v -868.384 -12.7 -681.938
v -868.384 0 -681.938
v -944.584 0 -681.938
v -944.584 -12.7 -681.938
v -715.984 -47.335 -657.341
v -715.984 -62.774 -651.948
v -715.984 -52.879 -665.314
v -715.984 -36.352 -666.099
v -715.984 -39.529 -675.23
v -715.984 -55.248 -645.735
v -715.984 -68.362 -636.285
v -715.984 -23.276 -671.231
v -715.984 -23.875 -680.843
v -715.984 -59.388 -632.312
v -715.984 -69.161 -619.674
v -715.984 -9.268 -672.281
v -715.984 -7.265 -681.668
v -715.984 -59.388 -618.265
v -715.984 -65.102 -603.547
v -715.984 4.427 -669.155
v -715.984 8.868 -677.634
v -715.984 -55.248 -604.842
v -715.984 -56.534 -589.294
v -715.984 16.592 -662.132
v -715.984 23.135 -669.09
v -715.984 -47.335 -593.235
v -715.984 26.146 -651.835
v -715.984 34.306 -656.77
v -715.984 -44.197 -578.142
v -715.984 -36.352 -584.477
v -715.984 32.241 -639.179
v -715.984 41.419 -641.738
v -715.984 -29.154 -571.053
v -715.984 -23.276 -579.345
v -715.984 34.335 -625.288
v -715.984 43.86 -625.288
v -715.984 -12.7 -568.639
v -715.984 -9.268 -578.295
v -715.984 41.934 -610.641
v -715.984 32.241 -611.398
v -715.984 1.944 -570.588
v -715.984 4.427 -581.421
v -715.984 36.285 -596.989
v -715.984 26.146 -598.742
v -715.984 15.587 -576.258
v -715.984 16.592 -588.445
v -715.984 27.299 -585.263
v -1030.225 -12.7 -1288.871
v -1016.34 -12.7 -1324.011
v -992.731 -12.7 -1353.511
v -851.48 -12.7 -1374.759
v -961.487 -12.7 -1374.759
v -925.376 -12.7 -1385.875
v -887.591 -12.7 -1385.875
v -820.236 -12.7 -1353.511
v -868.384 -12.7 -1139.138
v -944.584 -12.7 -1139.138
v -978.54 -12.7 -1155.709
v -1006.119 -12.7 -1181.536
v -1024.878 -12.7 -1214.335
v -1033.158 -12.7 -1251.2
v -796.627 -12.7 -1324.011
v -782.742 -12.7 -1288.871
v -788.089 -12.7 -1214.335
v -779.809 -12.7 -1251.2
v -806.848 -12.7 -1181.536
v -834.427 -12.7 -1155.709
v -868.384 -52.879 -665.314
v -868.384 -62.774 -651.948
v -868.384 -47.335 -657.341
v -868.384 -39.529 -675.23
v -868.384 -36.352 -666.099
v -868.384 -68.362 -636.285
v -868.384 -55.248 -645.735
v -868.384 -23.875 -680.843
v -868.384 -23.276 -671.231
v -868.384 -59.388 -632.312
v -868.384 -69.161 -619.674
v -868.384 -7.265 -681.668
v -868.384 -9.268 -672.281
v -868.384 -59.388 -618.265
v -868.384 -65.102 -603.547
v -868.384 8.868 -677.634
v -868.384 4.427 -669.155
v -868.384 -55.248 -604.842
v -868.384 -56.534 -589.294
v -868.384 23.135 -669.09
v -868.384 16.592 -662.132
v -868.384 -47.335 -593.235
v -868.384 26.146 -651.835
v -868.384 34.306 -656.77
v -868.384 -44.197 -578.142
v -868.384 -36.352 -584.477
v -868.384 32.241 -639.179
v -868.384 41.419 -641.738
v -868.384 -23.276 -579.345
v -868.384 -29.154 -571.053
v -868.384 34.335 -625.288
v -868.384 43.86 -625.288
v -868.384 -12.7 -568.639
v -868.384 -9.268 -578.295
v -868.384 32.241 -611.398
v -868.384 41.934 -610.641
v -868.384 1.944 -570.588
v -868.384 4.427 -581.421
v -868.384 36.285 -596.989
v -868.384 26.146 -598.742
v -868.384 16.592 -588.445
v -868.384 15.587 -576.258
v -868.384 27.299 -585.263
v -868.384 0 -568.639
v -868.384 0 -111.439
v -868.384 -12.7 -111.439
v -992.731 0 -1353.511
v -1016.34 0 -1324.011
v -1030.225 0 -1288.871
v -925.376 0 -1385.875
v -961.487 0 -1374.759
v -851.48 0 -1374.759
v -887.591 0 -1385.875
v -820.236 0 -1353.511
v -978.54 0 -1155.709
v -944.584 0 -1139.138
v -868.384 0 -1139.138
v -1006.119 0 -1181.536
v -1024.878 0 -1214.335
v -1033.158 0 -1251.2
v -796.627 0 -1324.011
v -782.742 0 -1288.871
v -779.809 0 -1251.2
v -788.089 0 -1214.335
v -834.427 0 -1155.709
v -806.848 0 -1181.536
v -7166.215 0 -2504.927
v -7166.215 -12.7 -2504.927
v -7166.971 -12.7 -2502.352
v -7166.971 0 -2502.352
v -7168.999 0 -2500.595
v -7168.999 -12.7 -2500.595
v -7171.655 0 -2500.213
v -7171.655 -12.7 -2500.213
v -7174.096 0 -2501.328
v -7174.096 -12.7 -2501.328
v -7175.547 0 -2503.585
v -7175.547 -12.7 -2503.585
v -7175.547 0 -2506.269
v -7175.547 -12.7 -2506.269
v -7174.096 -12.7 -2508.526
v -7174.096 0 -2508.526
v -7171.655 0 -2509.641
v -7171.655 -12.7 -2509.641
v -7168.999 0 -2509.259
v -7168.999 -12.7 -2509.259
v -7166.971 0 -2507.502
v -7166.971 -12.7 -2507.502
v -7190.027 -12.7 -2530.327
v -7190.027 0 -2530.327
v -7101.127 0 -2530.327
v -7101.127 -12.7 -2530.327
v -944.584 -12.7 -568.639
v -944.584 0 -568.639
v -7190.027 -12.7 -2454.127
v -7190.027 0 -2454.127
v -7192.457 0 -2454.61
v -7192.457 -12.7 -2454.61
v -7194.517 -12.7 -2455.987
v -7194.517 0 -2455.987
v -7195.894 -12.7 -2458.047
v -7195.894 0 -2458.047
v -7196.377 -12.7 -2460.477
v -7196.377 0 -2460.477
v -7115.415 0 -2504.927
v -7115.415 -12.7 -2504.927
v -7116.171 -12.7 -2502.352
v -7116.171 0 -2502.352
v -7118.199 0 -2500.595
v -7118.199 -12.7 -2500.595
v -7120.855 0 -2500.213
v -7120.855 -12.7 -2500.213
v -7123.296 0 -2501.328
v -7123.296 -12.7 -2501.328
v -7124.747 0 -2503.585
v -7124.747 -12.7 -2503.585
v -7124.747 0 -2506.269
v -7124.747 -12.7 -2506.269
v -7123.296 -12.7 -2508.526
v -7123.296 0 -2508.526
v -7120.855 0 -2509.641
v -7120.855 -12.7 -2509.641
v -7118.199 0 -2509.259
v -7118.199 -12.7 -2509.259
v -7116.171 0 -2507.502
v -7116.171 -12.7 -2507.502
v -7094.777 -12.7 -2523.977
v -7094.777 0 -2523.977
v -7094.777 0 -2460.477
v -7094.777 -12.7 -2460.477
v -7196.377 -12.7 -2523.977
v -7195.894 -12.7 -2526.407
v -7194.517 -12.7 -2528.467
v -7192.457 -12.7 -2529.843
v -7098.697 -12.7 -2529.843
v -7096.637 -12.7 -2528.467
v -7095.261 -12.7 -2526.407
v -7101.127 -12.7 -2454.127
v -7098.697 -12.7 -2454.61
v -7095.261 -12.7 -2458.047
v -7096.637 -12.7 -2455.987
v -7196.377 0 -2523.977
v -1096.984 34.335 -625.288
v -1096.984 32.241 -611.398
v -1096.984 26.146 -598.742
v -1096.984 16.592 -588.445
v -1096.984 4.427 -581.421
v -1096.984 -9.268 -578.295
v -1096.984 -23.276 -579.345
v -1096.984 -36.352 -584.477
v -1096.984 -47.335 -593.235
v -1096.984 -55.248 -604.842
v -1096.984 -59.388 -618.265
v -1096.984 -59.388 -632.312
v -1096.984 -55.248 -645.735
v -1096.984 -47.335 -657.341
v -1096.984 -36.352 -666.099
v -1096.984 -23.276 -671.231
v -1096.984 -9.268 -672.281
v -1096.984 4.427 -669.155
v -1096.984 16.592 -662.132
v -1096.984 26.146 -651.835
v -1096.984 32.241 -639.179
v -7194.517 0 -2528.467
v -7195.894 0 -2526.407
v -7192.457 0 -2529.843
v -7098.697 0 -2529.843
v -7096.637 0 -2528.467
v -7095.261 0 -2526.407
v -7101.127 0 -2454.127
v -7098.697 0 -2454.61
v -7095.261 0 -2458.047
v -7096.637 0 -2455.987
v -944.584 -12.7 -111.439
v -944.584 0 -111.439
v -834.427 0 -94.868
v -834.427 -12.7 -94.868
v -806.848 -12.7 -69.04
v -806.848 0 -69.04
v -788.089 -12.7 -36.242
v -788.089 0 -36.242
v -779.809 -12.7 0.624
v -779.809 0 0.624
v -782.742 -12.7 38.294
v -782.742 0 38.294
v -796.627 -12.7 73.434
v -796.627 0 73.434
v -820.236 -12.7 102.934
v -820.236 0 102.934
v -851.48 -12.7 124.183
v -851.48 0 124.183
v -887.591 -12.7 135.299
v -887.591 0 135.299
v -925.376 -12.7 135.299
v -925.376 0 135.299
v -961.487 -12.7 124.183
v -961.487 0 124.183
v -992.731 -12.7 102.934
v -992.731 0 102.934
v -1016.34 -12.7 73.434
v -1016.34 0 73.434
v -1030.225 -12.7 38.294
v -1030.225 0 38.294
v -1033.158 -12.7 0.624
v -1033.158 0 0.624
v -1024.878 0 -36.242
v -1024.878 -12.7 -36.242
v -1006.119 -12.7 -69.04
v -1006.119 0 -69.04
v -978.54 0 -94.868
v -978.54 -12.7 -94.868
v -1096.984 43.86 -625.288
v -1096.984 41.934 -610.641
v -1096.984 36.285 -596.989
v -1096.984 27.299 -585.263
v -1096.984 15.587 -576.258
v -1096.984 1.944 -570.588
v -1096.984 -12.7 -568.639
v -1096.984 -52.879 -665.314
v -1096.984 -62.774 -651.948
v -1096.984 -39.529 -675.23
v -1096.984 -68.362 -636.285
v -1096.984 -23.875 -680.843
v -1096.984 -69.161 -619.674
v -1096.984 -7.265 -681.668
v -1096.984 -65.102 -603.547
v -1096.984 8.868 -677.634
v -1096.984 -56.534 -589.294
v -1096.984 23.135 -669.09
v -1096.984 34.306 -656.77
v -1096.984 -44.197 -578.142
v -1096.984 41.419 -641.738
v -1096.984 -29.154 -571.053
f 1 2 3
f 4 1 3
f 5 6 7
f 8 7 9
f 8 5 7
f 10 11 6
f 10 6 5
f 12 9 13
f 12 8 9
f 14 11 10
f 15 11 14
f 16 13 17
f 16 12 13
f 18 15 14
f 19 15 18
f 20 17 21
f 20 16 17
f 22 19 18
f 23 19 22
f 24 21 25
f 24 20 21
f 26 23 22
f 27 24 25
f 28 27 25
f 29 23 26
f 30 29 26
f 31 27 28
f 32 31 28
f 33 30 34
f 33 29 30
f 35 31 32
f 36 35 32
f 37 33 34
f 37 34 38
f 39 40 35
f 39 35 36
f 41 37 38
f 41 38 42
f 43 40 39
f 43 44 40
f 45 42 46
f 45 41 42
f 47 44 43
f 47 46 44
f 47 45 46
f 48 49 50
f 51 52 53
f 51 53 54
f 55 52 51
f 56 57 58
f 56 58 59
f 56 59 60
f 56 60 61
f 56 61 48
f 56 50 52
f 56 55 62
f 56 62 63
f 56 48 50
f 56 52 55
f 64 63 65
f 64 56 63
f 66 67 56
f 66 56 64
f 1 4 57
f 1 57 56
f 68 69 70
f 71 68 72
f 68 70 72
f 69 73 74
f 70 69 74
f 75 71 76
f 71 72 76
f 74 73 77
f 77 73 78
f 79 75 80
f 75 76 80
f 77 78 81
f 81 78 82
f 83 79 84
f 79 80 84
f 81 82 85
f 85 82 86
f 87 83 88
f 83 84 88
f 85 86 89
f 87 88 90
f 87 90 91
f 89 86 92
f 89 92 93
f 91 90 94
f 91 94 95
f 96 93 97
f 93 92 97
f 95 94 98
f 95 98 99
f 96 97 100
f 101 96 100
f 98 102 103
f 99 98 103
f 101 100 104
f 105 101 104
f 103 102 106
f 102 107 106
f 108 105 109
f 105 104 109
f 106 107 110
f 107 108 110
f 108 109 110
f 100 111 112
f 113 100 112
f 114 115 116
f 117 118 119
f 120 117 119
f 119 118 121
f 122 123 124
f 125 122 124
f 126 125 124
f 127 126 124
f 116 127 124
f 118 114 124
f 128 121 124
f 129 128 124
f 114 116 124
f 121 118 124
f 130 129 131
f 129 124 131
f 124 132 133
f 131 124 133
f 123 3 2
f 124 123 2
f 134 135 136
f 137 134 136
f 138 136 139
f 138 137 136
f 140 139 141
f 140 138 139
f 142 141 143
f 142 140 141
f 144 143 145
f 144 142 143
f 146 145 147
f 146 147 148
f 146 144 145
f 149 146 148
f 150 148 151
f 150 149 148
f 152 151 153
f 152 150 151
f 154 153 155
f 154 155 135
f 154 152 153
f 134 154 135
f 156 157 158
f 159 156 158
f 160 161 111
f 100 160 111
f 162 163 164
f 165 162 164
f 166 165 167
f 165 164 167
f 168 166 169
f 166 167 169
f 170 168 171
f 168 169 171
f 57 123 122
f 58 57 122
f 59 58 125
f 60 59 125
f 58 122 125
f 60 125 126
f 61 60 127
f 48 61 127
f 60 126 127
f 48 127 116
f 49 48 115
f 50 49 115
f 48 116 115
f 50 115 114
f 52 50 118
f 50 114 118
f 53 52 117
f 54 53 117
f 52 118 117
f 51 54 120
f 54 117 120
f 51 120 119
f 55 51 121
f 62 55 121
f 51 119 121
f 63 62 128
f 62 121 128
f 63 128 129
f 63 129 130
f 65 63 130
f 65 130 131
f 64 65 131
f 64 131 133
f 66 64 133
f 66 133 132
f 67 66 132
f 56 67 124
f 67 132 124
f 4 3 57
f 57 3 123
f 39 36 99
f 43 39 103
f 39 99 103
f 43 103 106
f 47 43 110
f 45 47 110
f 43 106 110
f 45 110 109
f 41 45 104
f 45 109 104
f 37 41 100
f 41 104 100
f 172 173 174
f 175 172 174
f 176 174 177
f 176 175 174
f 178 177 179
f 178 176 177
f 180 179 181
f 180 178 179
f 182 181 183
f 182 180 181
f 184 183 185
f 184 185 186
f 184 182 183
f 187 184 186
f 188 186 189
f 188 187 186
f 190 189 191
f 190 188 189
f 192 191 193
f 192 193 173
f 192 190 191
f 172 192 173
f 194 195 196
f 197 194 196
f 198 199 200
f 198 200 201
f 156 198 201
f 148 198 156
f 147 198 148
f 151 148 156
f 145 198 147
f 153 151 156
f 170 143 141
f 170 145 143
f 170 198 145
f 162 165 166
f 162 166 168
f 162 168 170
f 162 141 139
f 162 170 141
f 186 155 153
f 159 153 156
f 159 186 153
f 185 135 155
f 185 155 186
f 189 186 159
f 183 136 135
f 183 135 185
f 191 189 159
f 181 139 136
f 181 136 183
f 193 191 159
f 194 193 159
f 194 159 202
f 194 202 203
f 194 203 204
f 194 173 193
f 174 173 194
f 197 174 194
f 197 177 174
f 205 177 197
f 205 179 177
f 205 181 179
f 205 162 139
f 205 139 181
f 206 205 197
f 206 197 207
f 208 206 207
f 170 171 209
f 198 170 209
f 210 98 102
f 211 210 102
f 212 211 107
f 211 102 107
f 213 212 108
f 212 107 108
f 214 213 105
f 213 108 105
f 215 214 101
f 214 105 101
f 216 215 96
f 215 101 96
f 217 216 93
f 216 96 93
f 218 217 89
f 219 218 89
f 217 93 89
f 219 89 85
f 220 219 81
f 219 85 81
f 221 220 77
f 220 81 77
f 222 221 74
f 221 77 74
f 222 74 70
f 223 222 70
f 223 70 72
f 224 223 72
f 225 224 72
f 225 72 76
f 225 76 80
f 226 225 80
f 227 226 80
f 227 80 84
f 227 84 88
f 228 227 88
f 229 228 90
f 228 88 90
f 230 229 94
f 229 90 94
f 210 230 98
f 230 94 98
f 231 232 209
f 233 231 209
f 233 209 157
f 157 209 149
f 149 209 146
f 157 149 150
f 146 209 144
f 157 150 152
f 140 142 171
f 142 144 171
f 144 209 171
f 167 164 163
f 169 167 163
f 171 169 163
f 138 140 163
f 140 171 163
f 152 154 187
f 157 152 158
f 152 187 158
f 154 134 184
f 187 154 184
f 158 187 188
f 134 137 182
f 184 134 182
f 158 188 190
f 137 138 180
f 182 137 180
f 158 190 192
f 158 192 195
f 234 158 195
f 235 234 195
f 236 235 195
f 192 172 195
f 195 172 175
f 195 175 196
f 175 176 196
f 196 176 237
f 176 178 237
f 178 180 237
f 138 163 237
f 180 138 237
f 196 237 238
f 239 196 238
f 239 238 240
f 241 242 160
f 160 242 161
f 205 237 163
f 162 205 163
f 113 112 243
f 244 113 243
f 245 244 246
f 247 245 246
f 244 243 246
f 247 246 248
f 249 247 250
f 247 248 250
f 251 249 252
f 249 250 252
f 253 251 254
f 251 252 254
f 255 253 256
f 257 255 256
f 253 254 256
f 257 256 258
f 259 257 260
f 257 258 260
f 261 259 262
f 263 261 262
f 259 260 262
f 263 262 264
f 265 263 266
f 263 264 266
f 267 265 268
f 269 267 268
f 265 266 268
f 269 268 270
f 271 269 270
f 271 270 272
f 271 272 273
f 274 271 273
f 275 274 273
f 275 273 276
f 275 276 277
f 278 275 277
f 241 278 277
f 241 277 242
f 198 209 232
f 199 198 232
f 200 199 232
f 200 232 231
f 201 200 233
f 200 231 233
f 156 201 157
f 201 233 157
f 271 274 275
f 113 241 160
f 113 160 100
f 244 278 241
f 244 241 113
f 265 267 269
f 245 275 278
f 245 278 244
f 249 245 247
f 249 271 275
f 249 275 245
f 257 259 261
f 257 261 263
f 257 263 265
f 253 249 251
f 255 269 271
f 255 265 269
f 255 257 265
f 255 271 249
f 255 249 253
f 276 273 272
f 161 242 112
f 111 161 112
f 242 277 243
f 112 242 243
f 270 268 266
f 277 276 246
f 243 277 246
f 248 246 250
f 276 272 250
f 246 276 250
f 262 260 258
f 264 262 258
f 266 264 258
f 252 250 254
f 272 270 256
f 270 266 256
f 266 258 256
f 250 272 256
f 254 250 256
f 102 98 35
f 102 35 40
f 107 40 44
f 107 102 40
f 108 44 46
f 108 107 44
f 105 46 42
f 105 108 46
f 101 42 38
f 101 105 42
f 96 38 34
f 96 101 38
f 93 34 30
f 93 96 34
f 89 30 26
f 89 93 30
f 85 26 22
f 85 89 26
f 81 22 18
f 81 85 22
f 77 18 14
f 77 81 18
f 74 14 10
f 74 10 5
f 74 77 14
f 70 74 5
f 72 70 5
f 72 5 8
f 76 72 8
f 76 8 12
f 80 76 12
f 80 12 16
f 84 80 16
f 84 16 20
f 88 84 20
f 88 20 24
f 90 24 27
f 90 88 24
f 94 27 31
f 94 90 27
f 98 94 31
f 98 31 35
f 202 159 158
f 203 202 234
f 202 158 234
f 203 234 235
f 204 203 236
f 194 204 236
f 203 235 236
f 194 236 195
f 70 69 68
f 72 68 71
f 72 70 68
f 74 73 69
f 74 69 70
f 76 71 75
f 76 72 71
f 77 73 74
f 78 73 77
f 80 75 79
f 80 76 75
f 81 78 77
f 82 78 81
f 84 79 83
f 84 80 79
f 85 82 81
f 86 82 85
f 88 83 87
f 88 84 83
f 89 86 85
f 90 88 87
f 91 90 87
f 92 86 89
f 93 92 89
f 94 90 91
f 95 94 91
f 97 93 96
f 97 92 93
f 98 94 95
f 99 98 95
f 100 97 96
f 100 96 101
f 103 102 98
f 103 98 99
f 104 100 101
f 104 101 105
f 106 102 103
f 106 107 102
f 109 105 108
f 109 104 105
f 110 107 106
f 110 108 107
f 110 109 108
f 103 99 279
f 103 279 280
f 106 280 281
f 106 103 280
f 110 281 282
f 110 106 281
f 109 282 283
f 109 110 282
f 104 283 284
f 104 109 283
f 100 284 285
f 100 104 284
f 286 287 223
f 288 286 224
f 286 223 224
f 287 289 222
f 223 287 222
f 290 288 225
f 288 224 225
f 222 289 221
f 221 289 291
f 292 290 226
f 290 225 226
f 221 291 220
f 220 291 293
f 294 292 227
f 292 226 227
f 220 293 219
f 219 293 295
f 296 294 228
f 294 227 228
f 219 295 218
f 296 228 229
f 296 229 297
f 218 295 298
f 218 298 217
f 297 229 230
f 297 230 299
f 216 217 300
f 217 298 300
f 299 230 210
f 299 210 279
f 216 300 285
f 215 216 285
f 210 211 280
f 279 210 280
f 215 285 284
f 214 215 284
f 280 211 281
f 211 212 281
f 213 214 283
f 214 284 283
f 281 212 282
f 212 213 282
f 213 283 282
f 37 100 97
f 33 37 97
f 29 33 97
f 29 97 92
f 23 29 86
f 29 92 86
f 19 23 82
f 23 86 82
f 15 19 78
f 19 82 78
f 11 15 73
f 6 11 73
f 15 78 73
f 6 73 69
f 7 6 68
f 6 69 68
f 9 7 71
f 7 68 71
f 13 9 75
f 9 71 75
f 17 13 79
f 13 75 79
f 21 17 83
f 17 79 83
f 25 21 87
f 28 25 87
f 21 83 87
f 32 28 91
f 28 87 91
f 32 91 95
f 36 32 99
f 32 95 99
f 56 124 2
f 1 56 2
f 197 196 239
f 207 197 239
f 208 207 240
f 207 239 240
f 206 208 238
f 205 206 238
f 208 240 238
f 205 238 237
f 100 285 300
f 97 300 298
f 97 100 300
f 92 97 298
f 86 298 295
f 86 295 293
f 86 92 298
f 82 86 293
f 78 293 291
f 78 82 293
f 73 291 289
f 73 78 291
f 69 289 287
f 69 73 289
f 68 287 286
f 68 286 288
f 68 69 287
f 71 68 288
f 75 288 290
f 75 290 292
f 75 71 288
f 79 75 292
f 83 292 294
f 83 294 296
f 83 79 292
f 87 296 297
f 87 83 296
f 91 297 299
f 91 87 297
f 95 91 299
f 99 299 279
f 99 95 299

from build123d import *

# Parameters (mm, degrees)
F1_DEPTH = 12.7
F0_R     = 4.7625
F2_R     = 47.12472142
F3_DEPTH = 152.4
F4_DEPTH = 228.6


# Not quite as in the source:
# - a feature names something its author has since deleted; it is built from what else it names


with BuildPart() as f1:
    # F0 (on Front) → F1 (new body)
    with BuildSketch(Plane.XZ):
        with BuildLine():
            Line((-868.383522886, -568.6385392112), (-868.383522886, -111.4385392112))
            ThreePointArc((-868.383522886, -111.4385392112), (-906.483522886, 136.7117393687), (-944.583522886, -111.4385392112))
            Line((-944.583522886, -111.4385392112), (-944.583522886, -568.6385392112))
            Line((-944.583522886, -568.6385392112), (-868.383522886, -568.6385392112))
        make_face()
    extrude(amount=F1_DEPTH)


with BuildPart() as f1b:
    # F0 (on Front) → F1, piece 2 (new body)
    with BuildSketch(Plane.XZ):
        with BuildLine():
            Line((-944.583522886, -681.9379820513), (-944.583522886, -1139.1379820513))
            ThreePointArc((-944.583522886, -1139.1379820513), (-906.483522886, -1387.2882606313), (-868.383522886, -1139.1379820513))
            Line((-868.383522886, -1139.1379820513), (-868.383522886, -681.9379820513))
            Line((-868.383522886, -681.9379820513), (-944.583522886, -681.9379820513))
        make_face()
    extrude(amount=F1_DEPTH)


with BuildPart() as f1c:
    # F0 (on Front) → F1, piece 3 (new body)
    with BuildSketch(Plane.XZ):
        with BuildLine():
            Line((-7101.1272773743, -2454.1268432617), (-7190.0272773743, -2454.1268432617))
            ThreePointArc((-7190.0272773743, -2454.1268432617), (-7194.5174054348, -2455.9867152012), (-7196.3772773743, -2460.4768432617))
            Line((-7196.3772773743, -2460.4768432617), (-7196.3772773743, -2523.9768432617))
            ThreePointArc((-7196.3772773743, -2523.9768432617), (-7194.5174054348, -2528.4669713223), (-7190.0272773743, -2530.3268432617))
            Line((-7190.0272773743, -2530.3268432617), (-7101.1272773743, -2530.3268432617))
            ThreePointArc((-7101.1272773743, -2530.3268432617), (-7096.6371493137, -2528.4669713223), (-7094.7772773743, -2523.9768432617))
            Line((-7094.7772773743, -2523.9768432617), (-7094.7772773743, -2460.4768432617))
            ThreePointArc((-7094.7772773743, -2460.4768432617), (-7096.6371493137, -2455.9867152012), (-7101.1272773743, -2454.1268432617))
        make_face()
        with Locations((-7170.9772773743, -2504.9268432617)):
            Circle(F0_R, mode=Mode.SUBTRACT)
        with Locations((-7120.1772773743, -2504.9268432617)):
            Circle(F0_R, mode=Mode.SUBTRACT)
    extrude(amount=F1_DEPTH)


with BuildPart() as f3:
    # F2 (on face) → F3 (new body)
    with BuildSketch(Plane.YZ.offset(-868.383522886)):
        with BuildLine():
            ThreePointArc((-12.7000001128, -568.638610381), (-52.8789346424, -665.3139022013), (43.8599243822, -625.2882606313))
            ThreePointArc((43.8599243822, -625.2882606313), (27.2993405667, -585.2626190613), (-12.7000001128, -568.638610381))
        make_face()
        with Locations((-12.7897970378, -625.2882606313)):
            Circle(F2_R, mode=Mode.SUBTRACT)
    extrude(amount=F3_DEPTH)


with BuildPart() as f4:
    # F4 (new): a face of the model
    f4_faces = [f3.part.faces().sort_by_distance(p)[0] for p in [
        (-868.383522886, -67.8372223712, -625.2882606313),
    ]]
    extrude(f4_faces, amount=F4_DEPTH)


solid = Compound([f1.part, f1b.part, f1c.part, f3.part, f4.part])
